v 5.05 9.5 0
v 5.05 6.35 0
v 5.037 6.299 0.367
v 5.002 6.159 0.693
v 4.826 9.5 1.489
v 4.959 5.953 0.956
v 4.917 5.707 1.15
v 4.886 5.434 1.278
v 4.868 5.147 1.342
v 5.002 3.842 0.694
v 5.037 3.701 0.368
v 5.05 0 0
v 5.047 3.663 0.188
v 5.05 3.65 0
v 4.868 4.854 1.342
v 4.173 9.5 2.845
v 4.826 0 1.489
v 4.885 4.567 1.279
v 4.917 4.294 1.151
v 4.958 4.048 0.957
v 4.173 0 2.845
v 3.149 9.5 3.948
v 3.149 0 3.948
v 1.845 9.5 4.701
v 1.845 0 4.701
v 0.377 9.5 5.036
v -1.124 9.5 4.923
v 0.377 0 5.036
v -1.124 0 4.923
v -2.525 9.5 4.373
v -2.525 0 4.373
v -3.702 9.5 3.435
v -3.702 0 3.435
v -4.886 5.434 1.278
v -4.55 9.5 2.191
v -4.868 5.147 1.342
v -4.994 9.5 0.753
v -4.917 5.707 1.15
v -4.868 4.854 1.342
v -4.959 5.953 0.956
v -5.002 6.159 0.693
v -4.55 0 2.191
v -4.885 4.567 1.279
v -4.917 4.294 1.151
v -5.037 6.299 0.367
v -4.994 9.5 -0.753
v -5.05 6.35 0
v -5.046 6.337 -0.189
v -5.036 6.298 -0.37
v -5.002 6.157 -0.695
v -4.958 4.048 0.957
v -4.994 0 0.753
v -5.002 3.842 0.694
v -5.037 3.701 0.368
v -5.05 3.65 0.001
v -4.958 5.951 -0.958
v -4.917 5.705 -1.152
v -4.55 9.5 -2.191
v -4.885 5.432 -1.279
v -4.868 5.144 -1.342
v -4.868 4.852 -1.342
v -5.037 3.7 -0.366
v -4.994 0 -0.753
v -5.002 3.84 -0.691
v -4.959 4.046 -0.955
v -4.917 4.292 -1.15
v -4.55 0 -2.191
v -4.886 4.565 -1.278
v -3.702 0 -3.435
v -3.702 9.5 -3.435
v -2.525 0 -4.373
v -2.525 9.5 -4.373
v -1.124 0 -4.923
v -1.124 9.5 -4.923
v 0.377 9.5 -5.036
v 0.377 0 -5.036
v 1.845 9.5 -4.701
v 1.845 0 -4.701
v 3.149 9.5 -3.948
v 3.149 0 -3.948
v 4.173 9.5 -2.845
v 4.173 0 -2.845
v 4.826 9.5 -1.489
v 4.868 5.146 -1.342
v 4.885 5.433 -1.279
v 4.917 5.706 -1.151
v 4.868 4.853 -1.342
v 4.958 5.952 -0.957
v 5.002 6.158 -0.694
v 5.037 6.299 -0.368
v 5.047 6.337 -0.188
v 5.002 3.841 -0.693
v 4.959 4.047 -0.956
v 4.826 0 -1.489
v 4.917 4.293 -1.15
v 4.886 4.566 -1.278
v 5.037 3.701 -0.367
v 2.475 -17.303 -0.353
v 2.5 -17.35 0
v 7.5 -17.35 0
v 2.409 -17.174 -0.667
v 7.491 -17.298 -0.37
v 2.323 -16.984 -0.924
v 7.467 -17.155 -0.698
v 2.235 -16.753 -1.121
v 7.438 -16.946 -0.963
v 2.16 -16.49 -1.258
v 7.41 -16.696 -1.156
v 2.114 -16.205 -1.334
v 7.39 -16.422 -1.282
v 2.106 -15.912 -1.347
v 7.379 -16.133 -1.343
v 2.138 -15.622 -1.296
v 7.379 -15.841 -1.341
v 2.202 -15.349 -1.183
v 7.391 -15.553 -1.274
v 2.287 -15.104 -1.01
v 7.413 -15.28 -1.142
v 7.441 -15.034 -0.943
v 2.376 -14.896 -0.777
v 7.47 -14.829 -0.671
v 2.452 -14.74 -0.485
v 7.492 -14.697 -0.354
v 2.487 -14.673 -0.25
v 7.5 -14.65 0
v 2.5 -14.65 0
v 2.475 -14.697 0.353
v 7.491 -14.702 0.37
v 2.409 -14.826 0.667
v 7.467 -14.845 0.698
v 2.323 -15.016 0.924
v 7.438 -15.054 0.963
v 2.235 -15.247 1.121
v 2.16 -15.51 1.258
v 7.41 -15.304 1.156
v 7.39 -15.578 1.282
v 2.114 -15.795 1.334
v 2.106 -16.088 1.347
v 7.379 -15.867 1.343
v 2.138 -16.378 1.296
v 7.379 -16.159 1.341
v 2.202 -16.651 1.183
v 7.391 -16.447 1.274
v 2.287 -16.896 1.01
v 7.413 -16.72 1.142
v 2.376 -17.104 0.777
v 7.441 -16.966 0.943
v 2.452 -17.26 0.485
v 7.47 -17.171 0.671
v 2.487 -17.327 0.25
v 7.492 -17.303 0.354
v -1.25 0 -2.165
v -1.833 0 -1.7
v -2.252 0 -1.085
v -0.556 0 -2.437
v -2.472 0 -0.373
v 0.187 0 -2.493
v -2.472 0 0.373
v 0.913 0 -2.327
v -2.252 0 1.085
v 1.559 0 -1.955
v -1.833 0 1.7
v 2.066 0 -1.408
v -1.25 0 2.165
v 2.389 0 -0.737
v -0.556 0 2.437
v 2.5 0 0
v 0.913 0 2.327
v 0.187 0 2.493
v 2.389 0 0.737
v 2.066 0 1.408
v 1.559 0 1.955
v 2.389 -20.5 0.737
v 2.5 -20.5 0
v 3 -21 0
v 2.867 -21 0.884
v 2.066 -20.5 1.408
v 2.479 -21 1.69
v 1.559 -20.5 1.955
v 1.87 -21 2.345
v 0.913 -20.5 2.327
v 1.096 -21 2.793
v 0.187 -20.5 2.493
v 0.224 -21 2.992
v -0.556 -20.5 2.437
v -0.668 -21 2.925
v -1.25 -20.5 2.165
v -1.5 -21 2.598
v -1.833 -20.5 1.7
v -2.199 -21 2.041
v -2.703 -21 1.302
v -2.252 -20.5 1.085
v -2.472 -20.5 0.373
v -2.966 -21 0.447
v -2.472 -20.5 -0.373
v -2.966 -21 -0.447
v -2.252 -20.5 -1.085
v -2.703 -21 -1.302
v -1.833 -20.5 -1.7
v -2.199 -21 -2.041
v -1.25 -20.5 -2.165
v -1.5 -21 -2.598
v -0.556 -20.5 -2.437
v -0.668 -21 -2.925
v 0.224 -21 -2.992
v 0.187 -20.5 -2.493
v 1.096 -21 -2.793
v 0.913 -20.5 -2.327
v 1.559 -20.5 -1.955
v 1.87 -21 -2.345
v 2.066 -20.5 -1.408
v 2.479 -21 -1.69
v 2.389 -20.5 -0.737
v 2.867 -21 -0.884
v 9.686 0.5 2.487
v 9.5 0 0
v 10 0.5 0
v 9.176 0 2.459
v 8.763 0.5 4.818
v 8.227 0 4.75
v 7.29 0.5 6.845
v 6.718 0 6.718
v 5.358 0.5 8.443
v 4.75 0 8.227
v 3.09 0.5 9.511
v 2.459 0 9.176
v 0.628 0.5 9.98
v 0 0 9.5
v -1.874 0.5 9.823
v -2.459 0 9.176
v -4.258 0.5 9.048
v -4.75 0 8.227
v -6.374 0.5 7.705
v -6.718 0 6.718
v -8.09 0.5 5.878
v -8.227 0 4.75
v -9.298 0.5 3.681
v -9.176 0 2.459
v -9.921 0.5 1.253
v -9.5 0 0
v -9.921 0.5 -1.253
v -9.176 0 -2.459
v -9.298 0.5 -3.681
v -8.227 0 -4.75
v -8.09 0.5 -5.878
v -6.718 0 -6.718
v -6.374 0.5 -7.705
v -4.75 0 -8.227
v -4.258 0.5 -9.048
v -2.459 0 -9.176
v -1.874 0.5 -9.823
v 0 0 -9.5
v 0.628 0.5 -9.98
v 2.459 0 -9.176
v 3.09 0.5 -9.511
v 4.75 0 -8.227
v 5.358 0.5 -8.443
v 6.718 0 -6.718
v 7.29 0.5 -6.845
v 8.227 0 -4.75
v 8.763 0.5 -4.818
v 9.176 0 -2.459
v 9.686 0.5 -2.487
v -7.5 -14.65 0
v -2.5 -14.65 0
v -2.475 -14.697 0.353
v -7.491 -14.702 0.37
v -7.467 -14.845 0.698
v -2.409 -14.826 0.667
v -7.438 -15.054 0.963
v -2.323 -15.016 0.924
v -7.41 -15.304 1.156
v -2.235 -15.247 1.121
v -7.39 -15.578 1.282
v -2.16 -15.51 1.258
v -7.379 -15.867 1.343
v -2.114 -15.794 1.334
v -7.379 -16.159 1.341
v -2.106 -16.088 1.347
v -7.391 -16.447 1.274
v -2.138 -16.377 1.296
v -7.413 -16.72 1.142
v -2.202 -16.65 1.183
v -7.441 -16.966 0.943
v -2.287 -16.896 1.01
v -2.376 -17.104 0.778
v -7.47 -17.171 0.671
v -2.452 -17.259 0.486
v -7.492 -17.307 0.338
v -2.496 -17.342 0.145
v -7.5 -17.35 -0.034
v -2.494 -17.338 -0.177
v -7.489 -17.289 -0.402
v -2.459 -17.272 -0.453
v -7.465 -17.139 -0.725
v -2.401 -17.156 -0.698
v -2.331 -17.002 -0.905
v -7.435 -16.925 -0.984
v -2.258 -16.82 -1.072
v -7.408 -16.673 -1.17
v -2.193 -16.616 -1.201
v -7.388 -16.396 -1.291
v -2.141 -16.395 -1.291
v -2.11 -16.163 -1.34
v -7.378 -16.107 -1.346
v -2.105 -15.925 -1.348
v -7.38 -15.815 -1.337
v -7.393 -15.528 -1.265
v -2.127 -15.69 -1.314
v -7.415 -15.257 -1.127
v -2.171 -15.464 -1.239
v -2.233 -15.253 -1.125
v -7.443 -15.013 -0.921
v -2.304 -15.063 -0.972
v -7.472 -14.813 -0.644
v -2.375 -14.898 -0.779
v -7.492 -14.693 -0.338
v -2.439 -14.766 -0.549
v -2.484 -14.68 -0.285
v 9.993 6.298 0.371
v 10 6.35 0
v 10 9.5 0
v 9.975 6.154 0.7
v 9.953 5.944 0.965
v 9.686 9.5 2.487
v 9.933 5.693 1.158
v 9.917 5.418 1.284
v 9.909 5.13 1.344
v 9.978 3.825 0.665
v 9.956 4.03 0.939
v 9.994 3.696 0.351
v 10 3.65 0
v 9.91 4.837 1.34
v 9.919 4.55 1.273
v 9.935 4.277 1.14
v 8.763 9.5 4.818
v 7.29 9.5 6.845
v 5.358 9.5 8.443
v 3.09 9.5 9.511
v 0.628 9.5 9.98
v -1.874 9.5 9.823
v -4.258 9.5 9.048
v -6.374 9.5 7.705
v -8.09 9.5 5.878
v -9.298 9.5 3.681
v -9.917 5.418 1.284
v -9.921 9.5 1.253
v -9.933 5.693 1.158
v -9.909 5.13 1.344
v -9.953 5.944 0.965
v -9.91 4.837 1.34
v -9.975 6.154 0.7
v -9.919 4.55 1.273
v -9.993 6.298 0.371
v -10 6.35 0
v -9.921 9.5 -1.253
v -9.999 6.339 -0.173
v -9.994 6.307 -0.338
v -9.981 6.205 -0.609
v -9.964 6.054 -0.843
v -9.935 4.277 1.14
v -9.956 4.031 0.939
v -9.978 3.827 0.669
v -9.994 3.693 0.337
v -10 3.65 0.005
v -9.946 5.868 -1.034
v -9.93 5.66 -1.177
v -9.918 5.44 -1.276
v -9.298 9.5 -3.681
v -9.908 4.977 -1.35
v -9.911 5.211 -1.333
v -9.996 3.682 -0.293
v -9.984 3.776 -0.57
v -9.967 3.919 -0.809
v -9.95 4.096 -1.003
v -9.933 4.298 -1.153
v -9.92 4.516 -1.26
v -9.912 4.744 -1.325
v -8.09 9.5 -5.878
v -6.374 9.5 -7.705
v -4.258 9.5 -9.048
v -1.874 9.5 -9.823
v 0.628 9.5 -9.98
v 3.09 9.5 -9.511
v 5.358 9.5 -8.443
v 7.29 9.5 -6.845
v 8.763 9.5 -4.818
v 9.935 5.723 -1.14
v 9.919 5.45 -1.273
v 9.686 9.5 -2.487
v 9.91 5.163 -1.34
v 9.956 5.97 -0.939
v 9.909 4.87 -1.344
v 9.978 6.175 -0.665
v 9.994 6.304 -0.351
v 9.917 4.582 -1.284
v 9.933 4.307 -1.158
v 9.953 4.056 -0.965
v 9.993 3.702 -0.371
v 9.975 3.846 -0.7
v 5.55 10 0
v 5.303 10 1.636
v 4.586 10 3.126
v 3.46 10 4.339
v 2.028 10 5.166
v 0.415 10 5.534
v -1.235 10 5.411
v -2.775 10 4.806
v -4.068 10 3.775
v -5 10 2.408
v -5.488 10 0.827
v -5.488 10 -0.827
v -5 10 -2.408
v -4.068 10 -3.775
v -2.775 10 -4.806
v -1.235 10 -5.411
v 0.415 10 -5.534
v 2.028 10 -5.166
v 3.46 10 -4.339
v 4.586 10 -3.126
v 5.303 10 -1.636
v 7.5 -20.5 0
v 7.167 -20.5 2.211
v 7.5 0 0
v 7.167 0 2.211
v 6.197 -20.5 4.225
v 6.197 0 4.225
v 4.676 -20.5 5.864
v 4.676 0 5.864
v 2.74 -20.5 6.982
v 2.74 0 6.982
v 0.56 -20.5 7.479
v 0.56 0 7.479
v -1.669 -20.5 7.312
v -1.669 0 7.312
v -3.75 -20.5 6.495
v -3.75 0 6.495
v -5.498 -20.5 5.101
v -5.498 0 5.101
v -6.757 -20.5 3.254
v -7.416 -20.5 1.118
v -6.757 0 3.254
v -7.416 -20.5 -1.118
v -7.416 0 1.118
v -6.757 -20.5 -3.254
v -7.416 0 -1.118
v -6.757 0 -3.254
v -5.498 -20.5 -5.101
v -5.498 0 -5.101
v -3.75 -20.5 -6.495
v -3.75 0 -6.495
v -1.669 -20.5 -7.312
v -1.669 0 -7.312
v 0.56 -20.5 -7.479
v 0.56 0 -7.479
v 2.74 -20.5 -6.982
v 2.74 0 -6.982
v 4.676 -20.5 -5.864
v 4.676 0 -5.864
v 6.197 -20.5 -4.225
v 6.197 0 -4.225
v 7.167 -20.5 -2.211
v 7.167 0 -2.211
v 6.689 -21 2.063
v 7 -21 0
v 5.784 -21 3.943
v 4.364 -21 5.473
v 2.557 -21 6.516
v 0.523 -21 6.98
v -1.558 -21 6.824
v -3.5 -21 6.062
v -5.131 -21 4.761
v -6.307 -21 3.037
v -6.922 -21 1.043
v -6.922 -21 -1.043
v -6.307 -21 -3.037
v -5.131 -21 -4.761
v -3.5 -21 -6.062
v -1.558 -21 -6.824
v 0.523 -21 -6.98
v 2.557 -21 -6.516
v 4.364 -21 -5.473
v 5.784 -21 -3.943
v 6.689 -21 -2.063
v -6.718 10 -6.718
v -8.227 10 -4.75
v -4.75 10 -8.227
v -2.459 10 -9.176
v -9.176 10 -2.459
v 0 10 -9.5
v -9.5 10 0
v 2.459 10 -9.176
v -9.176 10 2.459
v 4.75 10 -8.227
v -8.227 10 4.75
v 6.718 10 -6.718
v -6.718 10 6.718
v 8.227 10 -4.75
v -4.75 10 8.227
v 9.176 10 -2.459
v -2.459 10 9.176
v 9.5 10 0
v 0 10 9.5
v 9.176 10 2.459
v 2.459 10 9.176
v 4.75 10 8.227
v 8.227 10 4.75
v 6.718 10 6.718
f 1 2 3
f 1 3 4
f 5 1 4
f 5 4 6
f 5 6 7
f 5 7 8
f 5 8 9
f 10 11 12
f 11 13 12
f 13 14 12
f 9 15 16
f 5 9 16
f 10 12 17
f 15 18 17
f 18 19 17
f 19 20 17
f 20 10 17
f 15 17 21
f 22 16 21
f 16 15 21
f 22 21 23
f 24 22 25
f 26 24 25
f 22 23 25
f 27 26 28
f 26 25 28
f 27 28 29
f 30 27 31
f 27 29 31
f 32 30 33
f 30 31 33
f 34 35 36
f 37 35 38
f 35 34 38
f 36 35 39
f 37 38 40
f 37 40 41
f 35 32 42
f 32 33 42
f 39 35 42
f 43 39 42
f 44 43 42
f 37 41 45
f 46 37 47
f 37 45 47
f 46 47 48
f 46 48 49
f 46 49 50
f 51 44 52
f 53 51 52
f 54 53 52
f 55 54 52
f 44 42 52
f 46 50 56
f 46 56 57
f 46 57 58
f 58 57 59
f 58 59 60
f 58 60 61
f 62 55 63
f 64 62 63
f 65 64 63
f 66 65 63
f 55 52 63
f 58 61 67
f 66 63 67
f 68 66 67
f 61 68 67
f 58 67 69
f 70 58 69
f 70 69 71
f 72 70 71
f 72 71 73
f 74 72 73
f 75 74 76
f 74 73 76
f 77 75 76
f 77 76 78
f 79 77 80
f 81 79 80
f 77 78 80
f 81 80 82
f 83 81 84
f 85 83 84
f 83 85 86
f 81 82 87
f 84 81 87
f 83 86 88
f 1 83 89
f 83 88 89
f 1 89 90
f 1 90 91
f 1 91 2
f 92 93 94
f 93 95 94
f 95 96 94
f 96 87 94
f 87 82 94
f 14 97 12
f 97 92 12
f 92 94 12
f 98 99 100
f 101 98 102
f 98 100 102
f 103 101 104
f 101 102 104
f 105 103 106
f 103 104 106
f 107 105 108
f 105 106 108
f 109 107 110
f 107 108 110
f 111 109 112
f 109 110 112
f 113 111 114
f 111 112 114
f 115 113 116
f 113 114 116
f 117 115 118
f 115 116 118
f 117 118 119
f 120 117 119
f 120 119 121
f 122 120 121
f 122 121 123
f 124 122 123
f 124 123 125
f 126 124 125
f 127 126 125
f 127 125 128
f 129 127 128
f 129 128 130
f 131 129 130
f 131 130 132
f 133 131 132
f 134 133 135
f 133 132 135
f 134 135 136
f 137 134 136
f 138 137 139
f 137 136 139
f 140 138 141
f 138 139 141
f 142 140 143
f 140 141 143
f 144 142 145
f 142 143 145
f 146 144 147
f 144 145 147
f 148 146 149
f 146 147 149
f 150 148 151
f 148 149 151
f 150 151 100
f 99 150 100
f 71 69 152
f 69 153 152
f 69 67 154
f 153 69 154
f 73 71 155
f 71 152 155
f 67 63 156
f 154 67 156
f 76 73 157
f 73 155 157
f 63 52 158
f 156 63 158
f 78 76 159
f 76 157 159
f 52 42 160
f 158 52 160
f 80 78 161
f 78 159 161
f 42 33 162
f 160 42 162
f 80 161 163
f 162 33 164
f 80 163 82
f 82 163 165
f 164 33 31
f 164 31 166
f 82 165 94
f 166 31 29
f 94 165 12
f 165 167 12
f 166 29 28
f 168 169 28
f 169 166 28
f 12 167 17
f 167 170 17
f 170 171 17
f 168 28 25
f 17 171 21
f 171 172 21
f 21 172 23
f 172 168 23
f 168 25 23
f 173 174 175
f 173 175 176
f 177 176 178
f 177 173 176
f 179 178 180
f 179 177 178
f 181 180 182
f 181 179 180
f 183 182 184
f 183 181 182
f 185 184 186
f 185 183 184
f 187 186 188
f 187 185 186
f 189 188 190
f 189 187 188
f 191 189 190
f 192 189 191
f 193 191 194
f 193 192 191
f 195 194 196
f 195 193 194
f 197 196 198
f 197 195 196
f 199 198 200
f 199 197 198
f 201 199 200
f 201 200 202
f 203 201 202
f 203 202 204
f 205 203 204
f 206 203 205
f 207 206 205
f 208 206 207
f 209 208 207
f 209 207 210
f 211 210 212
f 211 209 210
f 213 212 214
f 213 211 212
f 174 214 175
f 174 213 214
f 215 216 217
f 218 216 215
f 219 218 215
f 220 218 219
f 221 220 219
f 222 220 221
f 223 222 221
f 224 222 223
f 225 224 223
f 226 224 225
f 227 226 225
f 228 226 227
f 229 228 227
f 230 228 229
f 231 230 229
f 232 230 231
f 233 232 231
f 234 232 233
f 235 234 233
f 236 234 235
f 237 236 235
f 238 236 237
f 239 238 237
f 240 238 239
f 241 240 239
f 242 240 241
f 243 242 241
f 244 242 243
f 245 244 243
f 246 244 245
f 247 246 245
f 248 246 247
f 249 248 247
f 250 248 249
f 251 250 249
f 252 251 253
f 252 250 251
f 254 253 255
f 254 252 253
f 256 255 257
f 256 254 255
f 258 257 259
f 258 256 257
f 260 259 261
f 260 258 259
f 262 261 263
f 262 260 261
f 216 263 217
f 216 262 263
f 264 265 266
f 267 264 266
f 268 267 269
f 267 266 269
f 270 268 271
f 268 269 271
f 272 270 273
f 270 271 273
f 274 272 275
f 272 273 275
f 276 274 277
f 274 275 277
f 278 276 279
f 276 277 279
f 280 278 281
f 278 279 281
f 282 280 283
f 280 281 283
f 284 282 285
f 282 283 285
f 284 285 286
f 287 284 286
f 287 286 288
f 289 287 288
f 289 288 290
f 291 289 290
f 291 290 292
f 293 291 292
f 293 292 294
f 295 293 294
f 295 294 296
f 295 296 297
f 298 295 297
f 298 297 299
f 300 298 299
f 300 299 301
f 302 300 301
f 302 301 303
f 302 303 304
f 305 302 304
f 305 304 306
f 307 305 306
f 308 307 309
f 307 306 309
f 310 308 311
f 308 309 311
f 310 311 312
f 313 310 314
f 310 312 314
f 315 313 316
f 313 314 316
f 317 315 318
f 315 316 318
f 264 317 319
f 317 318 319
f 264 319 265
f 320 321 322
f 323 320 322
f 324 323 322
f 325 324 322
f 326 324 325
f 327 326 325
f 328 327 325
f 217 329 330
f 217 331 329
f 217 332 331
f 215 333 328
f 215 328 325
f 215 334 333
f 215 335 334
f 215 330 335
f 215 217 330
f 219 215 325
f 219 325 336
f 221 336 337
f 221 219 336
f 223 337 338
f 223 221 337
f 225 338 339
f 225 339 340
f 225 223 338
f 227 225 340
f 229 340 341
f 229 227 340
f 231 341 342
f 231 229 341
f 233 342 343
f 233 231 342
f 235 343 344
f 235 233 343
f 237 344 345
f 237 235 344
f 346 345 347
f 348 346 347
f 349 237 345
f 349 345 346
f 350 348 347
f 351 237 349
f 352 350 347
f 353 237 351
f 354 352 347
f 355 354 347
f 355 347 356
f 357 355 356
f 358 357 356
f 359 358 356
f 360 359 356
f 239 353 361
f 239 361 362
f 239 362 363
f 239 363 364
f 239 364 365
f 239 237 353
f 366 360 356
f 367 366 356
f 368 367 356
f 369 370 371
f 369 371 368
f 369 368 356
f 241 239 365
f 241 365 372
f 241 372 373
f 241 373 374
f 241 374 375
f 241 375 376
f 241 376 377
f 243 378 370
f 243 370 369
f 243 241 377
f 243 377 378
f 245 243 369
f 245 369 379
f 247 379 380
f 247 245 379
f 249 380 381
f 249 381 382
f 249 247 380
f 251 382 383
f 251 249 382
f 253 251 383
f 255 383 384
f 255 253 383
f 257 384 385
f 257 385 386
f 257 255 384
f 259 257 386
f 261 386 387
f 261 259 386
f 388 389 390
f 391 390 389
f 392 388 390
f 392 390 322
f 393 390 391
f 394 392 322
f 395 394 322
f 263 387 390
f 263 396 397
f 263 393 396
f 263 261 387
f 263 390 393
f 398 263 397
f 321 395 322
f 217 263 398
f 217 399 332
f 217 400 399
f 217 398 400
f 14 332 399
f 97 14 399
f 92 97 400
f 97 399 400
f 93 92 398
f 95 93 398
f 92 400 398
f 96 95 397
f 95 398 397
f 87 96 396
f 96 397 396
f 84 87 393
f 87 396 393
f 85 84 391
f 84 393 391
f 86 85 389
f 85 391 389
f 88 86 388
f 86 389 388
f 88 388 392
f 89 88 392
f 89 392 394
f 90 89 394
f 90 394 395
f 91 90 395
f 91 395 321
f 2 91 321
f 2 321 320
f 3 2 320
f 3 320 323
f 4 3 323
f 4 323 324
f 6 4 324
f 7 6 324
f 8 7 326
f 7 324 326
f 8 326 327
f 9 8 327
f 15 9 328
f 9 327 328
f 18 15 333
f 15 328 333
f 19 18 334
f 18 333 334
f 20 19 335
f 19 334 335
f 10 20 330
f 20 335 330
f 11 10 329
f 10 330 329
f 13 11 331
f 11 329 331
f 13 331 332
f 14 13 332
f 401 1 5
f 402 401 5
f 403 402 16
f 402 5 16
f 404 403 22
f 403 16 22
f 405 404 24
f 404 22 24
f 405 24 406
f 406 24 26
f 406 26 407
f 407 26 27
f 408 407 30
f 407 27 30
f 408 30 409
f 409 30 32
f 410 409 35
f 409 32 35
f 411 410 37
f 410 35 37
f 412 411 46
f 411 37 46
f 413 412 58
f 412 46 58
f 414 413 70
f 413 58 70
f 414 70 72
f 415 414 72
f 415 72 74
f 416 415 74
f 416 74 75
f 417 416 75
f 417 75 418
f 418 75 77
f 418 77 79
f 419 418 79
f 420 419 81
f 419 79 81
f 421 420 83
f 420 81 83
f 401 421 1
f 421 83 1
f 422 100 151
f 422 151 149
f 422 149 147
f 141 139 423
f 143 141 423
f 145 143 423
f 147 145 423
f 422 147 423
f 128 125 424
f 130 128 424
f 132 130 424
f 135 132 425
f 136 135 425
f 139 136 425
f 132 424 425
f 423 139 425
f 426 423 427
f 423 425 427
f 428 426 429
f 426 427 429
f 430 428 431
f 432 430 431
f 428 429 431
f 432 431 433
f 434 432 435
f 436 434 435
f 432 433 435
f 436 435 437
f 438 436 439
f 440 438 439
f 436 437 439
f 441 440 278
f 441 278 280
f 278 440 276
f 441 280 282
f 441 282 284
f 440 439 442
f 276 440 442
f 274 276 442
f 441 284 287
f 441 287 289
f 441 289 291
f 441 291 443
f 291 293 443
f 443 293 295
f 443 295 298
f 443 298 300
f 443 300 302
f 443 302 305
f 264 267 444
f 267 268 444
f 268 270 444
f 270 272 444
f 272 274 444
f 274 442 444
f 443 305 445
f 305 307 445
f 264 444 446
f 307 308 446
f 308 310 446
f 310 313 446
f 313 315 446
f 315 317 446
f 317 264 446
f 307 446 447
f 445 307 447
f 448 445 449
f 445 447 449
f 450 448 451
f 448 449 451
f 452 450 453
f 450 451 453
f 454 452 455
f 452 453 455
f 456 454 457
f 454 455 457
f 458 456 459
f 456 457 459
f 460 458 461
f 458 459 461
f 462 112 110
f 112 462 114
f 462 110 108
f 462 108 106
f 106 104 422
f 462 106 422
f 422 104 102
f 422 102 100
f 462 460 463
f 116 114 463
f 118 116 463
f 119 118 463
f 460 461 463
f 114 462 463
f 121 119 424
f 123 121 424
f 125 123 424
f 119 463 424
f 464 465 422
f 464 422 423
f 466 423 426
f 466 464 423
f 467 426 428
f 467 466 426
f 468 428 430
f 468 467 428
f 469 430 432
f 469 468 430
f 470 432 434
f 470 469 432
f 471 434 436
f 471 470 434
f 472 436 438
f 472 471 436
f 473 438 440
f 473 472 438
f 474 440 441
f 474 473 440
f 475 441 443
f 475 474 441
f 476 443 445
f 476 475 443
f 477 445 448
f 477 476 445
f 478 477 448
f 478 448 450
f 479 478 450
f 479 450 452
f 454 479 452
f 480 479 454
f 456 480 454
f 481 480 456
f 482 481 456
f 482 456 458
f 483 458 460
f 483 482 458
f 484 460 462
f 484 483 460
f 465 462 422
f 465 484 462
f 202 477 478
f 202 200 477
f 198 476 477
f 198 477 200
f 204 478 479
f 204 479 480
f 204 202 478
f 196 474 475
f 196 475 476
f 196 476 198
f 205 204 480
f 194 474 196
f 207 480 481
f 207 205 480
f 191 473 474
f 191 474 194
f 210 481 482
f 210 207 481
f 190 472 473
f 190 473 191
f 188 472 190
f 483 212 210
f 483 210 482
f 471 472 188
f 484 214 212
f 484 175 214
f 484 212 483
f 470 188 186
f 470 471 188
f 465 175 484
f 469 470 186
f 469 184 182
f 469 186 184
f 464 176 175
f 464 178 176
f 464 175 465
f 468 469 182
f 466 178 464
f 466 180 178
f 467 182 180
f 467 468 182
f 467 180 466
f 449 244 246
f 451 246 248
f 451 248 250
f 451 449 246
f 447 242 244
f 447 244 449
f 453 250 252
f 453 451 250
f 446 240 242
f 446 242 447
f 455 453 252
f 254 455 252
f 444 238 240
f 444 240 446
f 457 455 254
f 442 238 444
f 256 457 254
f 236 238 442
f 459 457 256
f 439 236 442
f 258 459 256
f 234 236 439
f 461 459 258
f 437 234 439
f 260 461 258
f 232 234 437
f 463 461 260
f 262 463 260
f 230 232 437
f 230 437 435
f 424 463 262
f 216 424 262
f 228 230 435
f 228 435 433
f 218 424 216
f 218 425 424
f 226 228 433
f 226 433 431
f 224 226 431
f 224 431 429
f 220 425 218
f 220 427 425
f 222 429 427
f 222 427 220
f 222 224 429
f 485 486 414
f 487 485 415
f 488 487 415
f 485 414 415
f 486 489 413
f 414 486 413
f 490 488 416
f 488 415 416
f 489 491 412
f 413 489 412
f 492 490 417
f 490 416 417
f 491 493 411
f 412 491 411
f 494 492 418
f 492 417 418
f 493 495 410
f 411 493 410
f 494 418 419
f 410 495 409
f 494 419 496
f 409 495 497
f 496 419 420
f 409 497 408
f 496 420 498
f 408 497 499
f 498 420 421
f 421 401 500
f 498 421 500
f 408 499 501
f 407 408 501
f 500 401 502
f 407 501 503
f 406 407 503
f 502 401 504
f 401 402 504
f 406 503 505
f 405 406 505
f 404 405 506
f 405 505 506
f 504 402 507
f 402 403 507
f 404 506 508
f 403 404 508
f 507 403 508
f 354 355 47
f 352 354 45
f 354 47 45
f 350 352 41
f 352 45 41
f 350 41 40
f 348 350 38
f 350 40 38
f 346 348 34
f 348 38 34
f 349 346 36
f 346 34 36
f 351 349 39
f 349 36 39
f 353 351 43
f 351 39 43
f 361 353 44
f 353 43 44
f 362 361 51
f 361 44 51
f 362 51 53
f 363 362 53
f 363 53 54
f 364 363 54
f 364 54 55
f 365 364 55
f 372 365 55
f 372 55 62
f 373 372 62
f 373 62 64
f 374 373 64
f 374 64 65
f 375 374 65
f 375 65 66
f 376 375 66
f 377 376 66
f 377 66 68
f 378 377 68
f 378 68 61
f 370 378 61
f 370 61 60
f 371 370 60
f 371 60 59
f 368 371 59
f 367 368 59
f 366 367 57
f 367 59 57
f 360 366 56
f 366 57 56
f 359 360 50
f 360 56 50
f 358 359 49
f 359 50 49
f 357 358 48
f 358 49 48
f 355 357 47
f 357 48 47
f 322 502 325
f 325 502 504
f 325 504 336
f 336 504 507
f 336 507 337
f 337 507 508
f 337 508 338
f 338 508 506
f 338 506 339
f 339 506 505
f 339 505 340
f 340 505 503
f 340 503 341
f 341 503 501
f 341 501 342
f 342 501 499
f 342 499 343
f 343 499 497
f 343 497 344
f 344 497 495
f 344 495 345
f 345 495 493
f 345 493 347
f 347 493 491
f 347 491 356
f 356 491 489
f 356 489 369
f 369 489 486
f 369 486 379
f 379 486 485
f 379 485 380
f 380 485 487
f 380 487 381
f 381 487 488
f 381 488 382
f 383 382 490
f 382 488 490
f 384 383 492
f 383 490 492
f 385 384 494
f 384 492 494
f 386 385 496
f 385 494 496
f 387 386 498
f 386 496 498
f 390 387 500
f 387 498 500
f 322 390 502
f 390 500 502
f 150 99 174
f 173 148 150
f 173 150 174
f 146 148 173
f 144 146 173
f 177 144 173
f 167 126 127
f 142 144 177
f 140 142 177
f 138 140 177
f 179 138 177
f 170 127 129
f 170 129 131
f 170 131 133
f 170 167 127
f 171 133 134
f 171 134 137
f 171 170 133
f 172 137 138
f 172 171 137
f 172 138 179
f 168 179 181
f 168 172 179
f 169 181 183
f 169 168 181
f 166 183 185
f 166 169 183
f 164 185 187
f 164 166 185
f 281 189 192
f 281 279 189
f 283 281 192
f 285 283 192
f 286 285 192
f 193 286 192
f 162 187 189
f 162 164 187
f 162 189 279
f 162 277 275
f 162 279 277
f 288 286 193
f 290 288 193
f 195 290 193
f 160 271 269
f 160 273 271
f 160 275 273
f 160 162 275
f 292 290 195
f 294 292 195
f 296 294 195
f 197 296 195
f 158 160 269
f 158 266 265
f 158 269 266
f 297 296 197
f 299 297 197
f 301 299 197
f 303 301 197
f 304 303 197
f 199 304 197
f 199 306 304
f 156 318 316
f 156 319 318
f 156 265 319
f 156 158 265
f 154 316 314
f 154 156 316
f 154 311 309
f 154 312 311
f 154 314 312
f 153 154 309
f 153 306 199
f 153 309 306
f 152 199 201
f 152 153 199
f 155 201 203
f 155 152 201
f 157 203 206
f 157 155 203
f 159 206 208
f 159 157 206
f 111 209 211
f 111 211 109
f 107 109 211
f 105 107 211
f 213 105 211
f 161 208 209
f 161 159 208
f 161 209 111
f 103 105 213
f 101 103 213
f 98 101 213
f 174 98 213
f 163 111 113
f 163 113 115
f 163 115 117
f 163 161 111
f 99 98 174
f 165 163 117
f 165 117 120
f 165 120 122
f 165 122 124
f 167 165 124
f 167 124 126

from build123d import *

# Parameters (mm, degrees)
F0_R     = 7.5
F0_R_2   = 2.5
F1_DEPTH = 21
F2_R     = 10
F2_R_2   = 5.05
F3_DEPTH = 10
F5_D     = 2.7
F5_DEPTH = 10.001
F6_SIZE  = 0.5
F7_D     = 2.7


with BuildPart() as f1:
    # F0 (on Front) → F1 (new body)
    with BuildSketch(Plane.XZ):
        Circle(F0_R)
        Circle(F0_R_2, mode=Mode.SUBTRACT)
    extrude(amount=F1_DEPTH)

    # F2 (on Front) → F3 (join)
    with BuildSketch(Plane.XZ):
        Circle(F2_R)
        Circle(F2_R_2, mode=Mode.SUBTRACT)
    extrude(amount=-F3_DEPTH)

    # F5 (through all, one way)
    with BuildSketch(Plane.YZ):
        with Locations((5, 0), (-16, 0)):
            Circle(F5_D / 2)
    extrude(amount=-F5_DEPTH, mode=Mode.SUBTRACT)

    # F6
    f6_edges = [f1.edges().sort_by_distance(p)[0] for p in [
        (-10, 10, 0),
        (-5.05, 10, 0),
        (-10, 0, 0),
        (-7.5, -21, 0),
        (-2.5, -21, 0),
    ]]
    chamfer(f6_edges, length=F6_SIZE)

    # F7 (through all)
    with Locations(Plane(origin=(0, 0, 0), x_dir=(0, 1, 0), z_dir=(-1, 0, 0))):
        with Locations((5, 0), (-16, 0)):
            Hole(F7_D / 2)


solid = f1.part
